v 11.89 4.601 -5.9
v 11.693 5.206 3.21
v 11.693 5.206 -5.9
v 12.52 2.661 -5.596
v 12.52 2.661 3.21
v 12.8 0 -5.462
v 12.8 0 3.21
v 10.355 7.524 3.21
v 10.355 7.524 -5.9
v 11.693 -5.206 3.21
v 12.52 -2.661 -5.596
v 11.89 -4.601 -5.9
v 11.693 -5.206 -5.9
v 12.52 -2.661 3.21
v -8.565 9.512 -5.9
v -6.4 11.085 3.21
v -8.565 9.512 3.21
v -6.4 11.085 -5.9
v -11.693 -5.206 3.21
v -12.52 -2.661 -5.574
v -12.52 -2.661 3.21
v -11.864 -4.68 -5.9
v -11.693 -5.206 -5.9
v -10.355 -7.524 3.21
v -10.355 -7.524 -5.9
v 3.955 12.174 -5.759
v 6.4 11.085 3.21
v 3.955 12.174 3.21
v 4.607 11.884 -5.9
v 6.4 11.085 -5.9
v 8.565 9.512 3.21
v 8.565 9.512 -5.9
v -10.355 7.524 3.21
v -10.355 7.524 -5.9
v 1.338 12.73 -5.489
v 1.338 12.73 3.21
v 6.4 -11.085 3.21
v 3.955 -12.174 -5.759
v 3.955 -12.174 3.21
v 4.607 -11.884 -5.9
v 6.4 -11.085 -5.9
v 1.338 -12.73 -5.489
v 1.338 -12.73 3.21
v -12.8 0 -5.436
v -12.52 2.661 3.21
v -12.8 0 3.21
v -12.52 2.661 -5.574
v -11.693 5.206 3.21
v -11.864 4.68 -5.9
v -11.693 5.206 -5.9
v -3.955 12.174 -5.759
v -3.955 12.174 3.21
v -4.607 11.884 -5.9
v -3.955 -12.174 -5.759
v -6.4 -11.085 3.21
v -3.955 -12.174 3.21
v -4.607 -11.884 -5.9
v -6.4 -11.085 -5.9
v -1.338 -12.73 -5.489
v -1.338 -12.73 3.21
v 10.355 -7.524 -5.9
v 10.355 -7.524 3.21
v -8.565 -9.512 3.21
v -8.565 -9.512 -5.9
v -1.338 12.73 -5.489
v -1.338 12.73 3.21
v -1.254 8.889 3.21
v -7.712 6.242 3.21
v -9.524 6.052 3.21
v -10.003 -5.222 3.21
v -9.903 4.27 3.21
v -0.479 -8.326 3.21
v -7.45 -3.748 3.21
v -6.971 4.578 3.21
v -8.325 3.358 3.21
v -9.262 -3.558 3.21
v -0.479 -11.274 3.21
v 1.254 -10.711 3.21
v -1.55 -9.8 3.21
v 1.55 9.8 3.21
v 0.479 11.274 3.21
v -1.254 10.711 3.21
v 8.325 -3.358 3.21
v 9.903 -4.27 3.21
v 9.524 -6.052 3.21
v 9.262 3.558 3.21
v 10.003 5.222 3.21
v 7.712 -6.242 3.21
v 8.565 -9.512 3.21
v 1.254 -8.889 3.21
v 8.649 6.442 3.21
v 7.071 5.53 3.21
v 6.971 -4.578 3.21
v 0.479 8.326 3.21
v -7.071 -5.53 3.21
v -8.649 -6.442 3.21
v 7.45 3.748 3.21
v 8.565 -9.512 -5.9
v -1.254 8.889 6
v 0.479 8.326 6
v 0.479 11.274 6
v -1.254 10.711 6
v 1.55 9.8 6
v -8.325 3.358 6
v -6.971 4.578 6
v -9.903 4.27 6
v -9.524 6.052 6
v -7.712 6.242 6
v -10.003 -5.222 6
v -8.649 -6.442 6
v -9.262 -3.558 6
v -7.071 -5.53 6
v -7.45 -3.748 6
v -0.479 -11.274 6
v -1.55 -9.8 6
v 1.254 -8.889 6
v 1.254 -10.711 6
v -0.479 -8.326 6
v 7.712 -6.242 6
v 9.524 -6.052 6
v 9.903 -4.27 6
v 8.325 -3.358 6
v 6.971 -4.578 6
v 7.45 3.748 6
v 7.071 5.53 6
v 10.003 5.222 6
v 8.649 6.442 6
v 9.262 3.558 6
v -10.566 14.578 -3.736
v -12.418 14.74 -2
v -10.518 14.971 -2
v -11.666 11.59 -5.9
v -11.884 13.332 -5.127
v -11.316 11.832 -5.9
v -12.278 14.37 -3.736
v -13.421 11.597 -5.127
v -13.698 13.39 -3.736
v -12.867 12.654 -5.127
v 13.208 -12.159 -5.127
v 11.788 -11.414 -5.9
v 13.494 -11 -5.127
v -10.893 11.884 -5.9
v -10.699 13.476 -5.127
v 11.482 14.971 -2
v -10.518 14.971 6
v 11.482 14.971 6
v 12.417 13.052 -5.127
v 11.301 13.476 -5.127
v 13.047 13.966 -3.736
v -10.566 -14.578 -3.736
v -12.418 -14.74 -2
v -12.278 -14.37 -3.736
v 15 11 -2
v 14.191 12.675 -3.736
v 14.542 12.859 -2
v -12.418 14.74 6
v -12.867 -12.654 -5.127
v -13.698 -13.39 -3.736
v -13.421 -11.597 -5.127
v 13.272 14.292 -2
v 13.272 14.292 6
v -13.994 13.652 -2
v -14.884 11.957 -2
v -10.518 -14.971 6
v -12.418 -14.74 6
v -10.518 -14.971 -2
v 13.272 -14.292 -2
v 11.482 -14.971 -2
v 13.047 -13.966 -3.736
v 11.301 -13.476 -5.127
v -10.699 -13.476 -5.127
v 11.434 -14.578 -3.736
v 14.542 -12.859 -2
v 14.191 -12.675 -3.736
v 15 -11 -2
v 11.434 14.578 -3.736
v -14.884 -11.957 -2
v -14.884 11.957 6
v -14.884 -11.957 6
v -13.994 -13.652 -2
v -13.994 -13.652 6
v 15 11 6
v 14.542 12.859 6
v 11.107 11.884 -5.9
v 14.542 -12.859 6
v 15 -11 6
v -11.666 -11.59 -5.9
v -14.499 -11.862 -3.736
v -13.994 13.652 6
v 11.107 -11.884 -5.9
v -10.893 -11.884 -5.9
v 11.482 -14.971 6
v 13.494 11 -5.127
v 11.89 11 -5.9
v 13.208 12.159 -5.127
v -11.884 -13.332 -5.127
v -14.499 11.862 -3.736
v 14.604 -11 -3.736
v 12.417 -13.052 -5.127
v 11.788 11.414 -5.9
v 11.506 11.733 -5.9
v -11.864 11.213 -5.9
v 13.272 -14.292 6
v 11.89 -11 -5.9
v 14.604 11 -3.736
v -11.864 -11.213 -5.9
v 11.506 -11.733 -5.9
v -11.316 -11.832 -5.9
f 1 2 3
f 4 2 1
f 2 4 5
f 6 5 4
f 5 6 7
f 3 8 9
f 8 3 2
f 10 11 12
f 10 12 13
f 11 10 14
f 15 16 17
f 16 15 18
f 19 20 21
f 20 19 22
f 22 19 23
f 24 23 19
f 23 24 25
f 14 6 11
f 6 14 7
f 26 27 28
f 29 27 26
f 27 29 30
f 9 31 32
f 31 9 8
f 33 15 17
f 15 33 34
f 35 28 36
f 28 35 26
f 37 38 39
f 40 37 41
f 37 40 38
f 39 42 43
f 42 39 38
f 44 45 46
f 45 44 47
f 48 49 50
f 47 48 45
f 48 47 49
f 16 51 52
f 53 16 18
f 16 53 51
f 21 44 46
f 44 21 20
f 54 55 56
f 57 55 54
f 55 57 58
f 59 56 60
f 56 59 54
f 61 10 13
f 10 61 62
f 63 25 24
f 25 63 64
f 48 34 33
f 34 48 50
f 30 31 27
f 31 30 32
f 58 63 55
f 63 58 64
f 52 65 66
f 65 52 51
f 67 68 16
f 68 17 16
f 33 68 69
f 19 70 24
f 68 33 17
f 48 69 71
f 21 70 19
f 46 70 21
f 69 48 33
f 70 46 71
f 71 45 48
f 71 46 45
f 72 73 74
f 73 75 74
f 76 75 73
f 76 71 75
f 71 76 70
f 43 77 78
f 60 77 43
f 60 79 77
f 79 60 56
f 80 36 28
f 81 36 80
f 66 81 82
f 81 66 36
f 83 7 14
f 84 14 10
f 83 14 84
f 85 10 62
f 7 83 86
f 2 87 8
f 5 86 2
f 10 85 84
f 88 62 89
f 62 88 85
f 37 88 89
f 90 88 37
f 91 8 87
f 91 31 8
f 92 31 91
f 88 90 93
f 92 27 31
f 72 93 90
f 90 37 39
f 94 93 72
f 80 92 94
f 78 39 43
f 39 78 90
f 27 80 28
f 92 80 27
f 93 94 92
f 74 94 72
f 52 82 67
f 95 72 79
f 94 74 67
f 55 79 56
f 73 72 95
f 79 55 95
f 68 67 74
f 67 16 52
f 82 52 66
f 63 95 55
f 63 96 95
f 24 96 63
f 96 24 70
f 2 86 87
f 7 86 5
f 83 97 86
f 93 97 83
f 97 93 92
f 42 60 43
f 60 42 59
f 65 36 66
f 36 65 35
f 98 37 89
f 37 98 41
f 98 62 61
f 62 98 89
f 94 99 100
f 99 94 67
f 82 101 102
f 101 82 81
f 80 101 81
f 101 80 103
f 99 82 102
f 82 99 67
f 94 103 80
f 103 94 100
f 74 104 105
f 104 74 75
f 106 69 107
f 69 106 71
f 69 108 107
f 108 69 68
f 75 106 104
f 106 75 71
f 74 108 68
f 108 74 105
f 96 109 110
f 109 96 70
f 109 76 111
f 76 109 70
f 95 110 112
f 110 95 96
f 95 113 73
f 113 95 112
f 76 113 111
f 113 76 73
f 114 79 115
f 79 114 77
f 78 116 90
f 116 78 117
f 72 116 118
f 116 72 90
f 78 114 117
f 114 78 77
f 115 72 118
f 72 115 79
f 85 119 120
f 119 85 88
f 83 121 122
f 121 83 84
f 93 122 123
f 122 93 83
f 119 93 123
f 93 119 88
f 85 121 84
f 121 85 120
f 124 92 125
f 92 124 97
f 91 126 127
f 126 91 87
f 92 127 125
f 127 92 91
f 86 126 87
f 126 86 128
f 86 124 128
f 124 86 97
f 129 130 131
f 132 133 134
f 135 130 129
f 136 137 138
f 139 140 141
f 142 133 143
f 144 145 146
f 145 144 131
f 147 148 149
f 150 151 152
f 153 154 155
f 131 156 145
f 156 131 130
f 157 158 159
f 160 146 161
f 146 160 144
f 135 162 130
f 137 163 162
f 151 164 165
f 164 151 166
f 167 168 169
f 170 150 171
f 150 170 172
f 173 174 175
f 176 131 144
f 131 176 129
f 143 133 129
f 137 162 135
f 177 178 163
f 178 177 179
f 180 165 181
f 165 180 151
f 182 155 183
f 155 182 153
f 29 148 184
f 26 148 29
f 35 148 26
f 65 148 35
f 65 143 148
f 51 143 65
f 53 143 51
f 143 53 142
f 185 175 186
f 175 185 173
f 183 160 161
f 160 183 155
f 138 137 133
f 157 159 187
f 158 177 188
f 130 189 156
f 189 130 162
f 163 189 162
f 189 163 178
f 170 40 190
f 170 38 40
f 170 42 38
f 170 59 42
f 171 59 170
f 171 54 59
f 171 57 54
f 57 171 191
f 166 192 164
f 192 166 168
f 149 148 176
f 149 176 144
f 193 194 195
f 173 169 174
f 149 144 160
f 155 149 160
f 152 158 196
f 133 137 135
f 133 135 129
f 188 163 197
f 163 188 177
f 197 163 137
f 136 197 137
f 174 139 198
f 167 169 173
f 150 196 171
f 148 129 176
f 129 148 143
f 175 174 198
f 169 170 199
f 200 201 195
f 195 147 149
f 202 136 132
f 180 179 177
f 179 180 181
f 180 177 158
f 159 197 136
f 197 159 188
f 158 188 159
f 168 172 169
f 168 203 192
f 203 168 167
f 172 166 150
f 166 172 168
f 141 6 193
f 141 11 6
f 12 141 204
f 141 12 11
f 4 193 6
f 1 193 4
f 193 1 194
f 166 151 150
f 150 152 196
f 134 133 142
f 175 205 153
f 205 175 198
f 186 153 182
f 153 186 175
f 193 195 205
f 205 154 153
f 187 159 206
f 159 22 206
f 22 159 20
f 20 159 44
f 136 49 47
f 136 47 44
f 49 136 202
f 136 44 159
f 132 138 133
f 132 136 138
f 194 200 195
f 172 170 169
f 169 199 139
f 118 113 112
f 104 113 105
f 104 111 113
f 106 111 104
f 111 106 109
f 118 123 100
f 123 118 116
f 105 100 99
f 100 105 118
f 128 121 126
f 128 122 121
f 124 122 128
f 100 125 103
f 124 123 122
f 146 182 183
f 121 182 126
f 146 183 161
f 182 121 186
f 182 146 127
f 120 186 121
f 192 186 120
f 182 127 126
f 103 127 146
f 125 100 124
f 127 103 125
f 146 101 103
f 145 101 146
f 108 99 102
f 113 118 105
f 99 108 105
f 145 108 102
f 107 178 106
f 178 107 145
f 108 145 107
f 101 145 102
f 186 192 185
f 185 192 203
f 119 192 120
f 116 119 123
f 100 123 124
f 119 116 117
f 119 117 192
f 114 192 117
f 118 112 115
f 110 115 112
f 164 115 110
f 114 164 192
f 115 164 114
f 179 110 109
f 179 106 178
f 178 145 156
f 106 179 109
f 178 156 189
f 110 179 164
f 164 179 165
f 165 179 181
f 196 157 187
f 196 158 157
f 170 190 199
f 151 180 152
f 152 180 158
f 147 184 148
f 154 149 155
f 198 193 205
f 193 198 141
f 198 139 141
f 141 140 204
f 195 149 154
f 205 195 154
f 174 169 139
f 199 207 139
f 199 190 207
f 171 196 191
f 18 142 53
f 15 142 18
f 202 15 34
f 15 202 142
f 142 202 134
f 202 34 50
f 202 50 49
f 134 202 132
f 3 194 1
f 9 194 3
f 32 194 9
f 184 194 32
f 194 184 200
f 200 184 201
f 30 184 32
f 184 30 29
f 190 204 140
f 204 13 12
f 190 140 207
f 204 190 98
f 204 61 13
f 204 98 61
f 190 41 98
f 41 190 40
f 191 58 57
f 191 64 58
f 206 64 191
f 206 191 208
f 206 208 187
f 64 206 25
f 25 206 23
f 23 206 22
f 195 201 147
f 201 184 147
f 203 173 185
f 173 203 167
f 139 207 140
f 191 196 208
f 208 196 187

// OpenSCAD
// file: modules/roundedcube.scad
// More information: https://danielupshaw.com/openscad-rounded-corners/

module roundedcube(size = [1, 1, 1], center = false, radius = 0.5, apply_to = "all") {
	// If single value, convert to [x, y, z] vector
	size = (size[0] == undef) ? [size, size, size] : size;

	translate_min = radius;
	translate_xmax = size[0] - radius;
	translate_ymax = size[1] - radius;
	translate_zmax = size[2] - radius;

	diameter = radius * 2;

	obj_translate = (center == false) ?
		[0, 0, 0] : [
			-(size[0] / 2),
			-(size[1] / 2),
			-(size[2] / 2)
		];

	translate(v = obj_translate) {
		hull() {
			for (translate_x = [translate_min, translate_xmax]) {
				x_at = (translate_x == translate_min) ? "min" : "max";
				for (translate_y = [translate_min, translate_ymax]) {
					y_at = (translate_y == translate_min) ? "min" : "max";
					for (translate_z = [translate_min, translate_zmax]) {
						z_at = (translate_z == translate_min) ? "min" : "max";

						translate(v = [translate_x, translate_y, translate_z])
						if (
							(apply_to == "all") ||
							(apply_to == "xmin" && x_at == "min") || (apply_to == "xmax" && x_at == "max") ||
							(apply_to == "ymin" && y_at == "min") || (apply_to == "ymax" && y_at == "max") ||
							(apply_to == "zmin" && z_at == "min") || (apply_to == "zmax" && z_at == "max")
						) {
							sphere(r = radius);
						} else {
							rotate = 
								(apply_to == "xmin" || apply_to == "xmax" || apply_to == "x") ? [0, 90, 0] : (
								(apply_to == "ymin" || apply_to == "ymax" || apply_to == "y") ? [90, 90, 0] :
								[0, 0, 0]
							);
							rotate(a = rotate)
							cylinder(h = diameter, r = radius, center = true);
						}
					}
				}
			}
		}
	}
}
// file: parameters/commonParameters.scad
// All measurements in millimeters

// "horizontal" and "vertical" refer to how they are printed on the print bed,
// not how they work on the final assembly.
// ALWAYS print verticle pipes straight up if possible, that is 90 degrees from the bed.
// Attempting to print a slanted pipe will be troublesome and require testing for a proper size.
// However, you can print ANY angle ON the bed.

// 1.25" PVC Pipe:
horizontalPipeInsideDiameter_1_25pvc = 42.9;
verticalPipeInsideDiameter_1_25pvc = 42.5;

// 0.5" PVC Pipe:
horizontalPipeInsideDiameter_0_50pvc = 22.1;
verticalPipeInsideDiameter_0_50pvc = 21.7;

// Parameters
jointLegLength = 50;
jointWallThickness = 3.5;
jointPinningHoleDiameter = 7;
jointPinHoleOffset = 10;

// Walker Foot Parameters
inchesToMmConversionFactor = 25.4;

// Current idea is 11 x 21 inches.
walkerFootHeight = 11 * inchesToMmConversionFactor;
walkerFootLength = 21 * inchesToMmConversionFactor;
// Back of Foot is 4 inches longer to cause foot to hang AND LOOK as desired
// I tried 1 inch and it had basically NO affect on how it hangs.
// I think it looks cool at 4 inches, so I am going to test that.
// I *THINK* that it actually doesn't affect lenght of the walker, because the front
// of one compensates for the back of the other.
walkerFootCenterOffset = 0 * inchesToMmConversionFactor; // Remember to multiply any offset by the conversion factor.
walkerFootFrontLength = (walkerFootLength / 2) - (walkerFootCenterOffset / 2);
walkerFootBackLength = (walkerFootLength / 2) + (walkerFootCenterOffset / 2);

footLowerJointLegLength = 75;

// Angles
// This site is great for visualizing what you want: https://www.blocklayer.com/trig/scaleneeng.aspx
// Use this site to check your math and results: https://www.calculator.net/right-triangle-calculator.html
//echo("=======================================================");
//echo("Walker Foot Parameters");
//echo("walkerFootLength", walkerFootLength, walkerFootFrontLength + walkerFootBackLength);
//echo("=======================================================");
//echo("Front:");
//echo("walkerFootHeight (a)", walkerFootHeight);
//echo("walkerFootFrontLength (b)", walkerFootFrontLength);
//walkerFootFrontTriangleTopLength = sqrt(pow(walkerFootHeight, 2) + pow(walkerFootFrontLength, 2));
//echo("walkerFootFrontTriangleTopLength (c)", walkerFootFrontTriangleTopLength);
//walkerFootFrontJointAngle = asin(walkerFootHeight / walkerFootFrontTriangleTopLength);
//echo("walkerFootFrontJointAngle (α):", walkerFootFrontJointAngle);
//walkerAnkleFrontAngle = asin(walkerFootFrontLength / walkerFootFrontTriangleTopLength);
//echo("walkerAnkleFrontAngle (β)", walkerAnkleFrontAngle);
//echo("-------------------------------------------------------");
//echo("Back");
//echo("walkerFootBackLength (b)", walkerFootBackLength);
//walkerFootBackTriangleTopLength = sqrt(pow(walkerFootHeight, 2) + pow(walkerFootBackLength, 2));
//echo("walkerFootBackTriangleTopLength (c)", walkerFootBackTriangleTopLength);
//walkerFootBackJointAngle = asin(walkerFootHeight / walkerFootBackTriangleTopLength);
//echo("walkerFootBackJointAngle (α):", walkerFootBackJointAngle);
//walkerAnkleBackAngle = asin(walkerFootBackLength / walkerFootBackTriangleTopLength);
//echo("walkerAnkleBackAngle (β)", walkerAnkleBackAngle);
//echo("=======================================================");



// This height is purely based on giving space for nice triangles supports.
// It could be shorter, just be sure to adjust the triangles.
walkerBodyLowerShaftHolderRollerBearingHeightAboveThrustBearing = 50;

// 12v Battery Box
batteryHolderWallThickness = 5;

// Battery Dimensions
// https://www.power-sonic.com/product/ps-1290/
batteryHeight = 94;
batteryWidth = 65.6; // Ben uses 65.6, Web Site says 65
batteryLength = 150.6; // Ben uses 150.6, Web site says 141
batteryBoxDepth = 60; // This is arbitrary. Ben uses 60 for the Dalek

// Colors
JointColor = "CornflowerBlue";
PipeColor = "Pink";

// Resoution
// This is perfect for 3D Printing,
// but you may want to comment it out while working to improve preview
// performance
//$fa = 1;
//$fs = 0.4;
// Although this makes it VERY high rez, which might be better for the slicer? Experimenting with it instead.
// NOTE that using $fn causes FreeCAD and hence .step files exported to Fusion 360 to show round items as a series of faces instead of a single object.
//$fn = 500;
// main file
// Load in some defaults
include <parameters/commonParameters.scad>;

include <modules/roundedcube.scad>;

shoulderSquareWidth = 30; // 100
shoulderBlockHeight = 4; // 5
motorMountDepth = 52.2;
motorMountWidth = 38.2;

shaftDiameter = 6.2;
hubLength = 4.2 + 5;
hubDiameter = 25.4 + 0.2;
screwHoleDiameter = 3.1; // Perfect
screwHolePosition = (hubDiameter / 2) - 3;

module screwHole(rotation) {
    rotate([0, 0, rotation])
        translate([0, screwHolePosition, 0])
            cylinder(d = screwHoleDiameter, h = shoulderBlockHeight * 4, center = true);
}

difference() {
    roundedcube([shoulderSquareWidth, shoulderSquareWidth, shoulderBlockHeight], true, shoulderBlockHeight, "zmax");

    union() {
        translate([0, 0, - shoulderBlockHeight * 1.5])
            cylinder(d = hubDiameter, h = hubLength + 0.01, center = false);
        screwHole(0);
        screwHole(360 / 6);
        screwHole((360 / 6) * 2);
        screwHole((360 / 6) * 3);
        screwHole((360 / 6) * 4);
        screwHole((360 / 6) * 5);
    }
}

pipeHolderWidth = (horizontalPipeInsideDiameter_0_50pvc) + (jointWallThickness * 2);

module automatonJointPipeHolder(oppositeSide = 1) {
    rotate([0, 90, 0])
        translate([- ((pipeHolderWidth / 2) + (shoulderBlockHeight)), 0, oppositeSide * ((shoulderSquareWidth / 2) - (
            pipeHolderWidth / 2))])
            difference() {
                roundedcube([pipeHolderWidth, shoulderSquareWidth, pipeHolderWidth], true, 5, "xmin");
                union() {
                    rotate([90, 0, 0])
                        cylinder(d = horizontalPipeInsideDiameter_0_50pvc, h = shoulderSquareWidth + 10, center = true);
                    // Make a hole near the end of the leg for pinning
                    // The -0.01 ensures that the end of the tube is clear.
                    rotate([0, 0, 0])
                        translate([0, - ((shoulderSquareWidth / 2) - (jointPinHoleOffset * 2)), 0])
                            cylinder(
                            h = pipeHolderWidth + 0.01 + 100, d = jointPinningHoleDiameter, center
                            = true);
                }
            }
}

//automatonJointPipeHolder();
//automatonJointPipeHolder(- 1);
